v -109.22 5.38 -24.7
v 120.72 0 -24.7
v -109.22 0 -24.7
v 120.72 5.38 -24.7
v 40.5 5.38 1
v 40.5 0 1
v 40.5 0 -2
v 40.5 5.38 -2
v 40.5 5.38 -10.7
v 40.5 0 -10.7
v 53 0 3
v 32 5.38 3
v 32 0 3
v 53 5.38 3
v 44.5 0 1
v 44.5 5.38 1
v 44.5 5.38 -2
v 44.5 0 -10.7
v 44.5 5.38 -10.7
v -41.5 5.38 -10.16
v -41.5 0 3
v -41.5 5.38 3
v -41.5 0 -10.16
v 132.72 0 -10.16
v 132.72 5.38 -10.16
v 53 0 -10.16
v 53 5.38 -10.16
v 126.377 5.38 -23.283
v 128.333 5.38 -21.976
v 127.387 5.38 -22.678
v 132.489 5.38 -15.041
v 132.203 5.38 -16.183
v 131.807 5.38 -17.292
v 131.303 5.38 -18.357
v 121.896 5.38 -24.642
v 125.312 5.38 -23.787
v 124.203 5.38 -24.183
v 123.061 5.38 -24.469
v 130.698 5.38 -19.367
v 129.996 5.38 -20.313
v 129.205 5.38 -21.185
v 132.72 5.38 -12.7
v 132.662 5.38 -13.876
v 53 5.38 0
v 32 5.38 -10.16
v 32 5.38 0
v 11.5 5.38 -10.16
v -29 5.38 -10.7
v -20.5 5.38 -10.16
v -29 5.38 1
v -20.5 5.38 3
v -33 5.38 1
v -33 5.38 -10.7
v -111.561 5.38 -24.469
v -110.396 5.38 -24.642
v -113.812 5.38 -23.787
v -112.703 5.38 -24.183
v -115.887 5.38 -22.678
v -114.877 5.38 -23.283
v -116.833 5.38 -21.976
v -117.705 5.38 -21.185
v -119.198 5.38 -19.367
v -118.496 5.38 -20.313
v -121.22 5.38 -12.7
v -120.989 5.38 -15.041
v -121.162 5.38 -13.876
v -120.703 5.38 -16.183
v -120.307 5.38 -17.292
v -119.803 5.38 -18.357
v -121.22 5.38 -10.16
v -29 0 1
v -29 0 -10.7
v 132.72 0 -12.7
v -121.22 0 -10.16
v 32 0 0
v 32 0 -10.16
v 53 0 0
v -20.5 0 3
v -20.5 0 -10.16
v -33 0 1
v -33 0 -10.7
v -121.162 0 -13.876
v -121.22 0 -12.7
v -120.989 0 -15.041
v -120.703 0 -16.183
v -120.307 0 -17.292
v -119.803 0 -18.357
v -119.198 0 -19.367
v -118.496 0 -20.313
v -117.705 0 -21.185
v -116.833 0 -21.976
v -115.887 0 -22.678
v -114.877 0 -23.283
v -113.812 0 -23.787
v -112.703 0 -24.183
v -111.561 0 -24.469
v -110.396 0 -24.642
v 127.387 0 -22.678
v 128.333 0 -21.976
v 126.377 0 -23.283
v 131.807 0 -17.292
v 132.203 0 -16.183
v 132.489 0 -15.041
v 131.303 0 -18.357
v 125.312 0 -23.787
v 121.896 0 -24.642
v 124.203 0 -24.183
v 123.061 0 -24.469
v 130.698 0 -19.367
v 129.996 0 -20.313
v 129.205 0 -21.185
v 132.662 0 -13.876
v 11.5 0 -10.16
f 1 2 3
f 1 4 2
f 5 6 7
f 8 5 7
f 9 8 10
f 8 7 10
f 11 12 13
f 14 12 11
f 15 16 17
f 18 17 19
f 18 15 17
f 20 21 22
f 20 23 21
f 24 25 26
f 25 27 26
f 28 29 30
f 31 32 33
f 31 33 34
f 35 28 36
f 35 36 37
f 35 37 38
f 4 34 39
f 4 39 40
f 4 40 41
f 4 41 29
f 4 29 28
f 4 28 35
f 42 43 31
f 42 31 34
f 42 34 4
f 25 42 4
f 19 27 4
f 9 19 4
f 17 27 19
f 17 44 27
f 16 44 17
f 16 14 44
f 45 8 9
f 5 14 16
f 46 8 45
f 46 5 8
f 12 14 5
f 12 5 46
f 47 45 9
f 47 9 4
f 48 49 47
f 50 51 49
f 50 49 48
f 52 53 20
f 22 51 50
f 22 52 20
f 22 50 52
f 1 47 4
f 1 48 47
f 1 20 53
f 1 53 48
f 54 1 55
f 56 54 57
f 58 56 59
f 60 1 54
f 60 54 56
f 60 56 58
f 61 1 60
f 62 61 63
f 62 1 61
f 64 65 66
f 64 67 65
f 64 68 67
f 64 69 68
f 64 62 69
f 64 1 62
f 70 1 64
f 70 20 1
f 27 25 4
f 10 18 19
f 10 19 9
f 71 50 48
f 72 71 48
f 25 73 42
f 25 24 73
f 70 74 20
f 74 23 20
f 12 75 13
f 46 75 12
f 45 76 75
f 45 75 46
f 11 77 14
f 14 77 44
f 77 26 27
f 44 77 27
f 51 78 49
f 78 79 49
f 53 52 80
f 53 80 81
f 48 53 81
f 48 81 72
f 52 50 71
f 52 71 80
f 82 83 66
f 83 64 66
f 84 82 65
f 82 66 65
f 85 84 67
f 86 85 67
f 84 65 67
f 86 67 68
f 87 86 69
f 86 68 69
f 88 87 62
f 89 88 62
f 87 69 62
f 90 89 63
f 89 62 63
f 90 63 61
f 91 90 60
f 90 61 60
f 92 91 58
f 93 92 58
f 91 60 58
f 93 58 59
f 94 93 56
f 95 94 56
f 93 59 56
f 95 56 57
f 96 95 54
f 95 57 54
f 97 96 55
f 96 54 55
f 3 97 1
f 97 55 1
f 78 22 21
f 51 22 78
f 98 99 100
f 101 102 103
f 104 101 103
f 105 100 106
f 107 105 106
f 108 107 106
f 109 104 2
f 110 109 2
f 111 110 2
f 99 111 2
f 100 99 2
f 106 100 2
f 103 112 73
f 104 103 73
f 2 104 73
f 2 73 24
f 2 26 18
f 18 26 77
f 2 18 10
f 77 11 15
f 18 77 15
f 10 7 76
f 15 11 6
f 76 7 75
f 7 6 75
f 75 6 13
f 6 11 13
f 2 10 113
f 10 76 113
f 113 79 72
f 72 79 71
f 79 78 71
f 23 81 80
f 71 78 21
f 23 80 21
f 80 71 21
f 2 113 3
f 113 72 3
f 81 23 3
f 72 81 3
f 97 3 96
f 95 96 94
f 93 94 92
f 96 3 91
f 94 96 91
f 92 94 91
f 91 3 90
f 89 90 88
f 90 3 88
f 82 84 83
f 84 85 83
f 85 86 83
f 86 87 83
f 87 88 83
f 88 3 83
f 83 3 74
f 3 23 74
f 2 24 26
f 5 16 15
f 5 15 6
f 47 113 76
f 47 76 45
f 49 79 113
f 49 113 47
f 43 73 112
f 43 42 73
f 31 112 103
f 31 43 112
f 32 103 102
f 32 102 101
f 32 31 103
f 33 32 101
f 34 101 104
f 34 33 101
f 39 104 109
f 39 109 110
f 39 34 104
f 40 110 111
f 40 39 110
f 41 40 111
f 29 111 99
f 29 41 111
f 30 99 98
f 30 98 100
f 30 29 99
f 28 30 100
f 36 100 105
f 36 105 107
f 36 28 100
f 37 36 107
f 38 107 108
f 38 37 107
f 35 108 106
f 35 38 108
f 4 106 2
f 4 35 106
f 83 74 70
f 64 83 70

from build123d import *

# Parameters (mm, degrees)
SKETCH1_W             = 62
SKETCH1_H             = 12.7
BOSS_EXTRUDE1_DEPTH   = 5.38
SKETCH2_W             = 20.5
SKETCH2_H             = 5.38
CUT_EXTRUDE1_DEPTH    = 10.16
SKETCH3_W             = 4
SKETCH3_H             = 8.7
CUT_EXTRUDE2_DEPTH    = 5.38
SKETCH4_W             = 2.54
SKETCH4_H             = 5.38
BOSS_EXTRUDE2_DEPTH   = 59.22
SKETCH5_W             = 2.54
SKETCH5_H             = 5.38
BOSS_EXTRUDE3_DEPTH   = 11.5
BODY_MOVE_COPY3_ANGLE = 180
SKETCH6_W             = 21
SKETCH6_H             = 5.38
BOSS_EXTRUDE4_DEPTH   = 3
SKETCH7_W             = 21
SKETCH7_H             = 5.38
BOSS_EXTRUDE5_DEPTH   = 3
SKETCH8_W             = 4
SKETCH8_H             = 5.38
CUT_EXTRUDE3_DEPTH    = 3
SKETCH9_W             = 4
SKETCH9_H             = 5.38
CUT_EXTRUDE4_DEPTH    = 3
SKETCH11_W            = 253.94
SKETCH11_H            = 5.38
BOSS_EXTRUDE6_DEPTH   = 12
FILLET1_R             = 12


with BuildPart() as part:
    # Sketch1 → Boss-Extrude1 (new body)
    with BuildSketch(Plane(origin=(0, 0, 0), x_dir=(1, 0, 0), z_dir=(0, 1, 0))):
        with Locations((-31, 6.35)):
            Rectangle(SKETCH1_W, SKETCH1_H)
    extrude(amount=BOSS_EXTRUDE1_DEPTH)

    # Sketch2 → Cut-Extrude1 (cut)
    with BuildSketch(Plane.XY):
        with Locations((-51.75, 2.69)):
            Rectangle(SKETCH2_W, SKETCH2_H)
        with Locations((-10.25, 2.69)):
            Rectangle(SKETCH2_W, SKETCH2_H)
    extrude(amount=-CUT_EXTRUDE1_DEPTH, mode=Mode.SUBTRACT)

    # Sketch3 → Cut-Extrude2 (cut)
    with BuildSketch(Plane(origin=(0, 5.38, 0), x_dir=(1, 0, 0), z_dir=(0, 1, 0))):
        with Locations((-31, 6.35)):
            Rectangle(SKETCH3_W, SKETCH3_H)
    extrude(amount=-CUT_EXTRUDE2_DEPTH, mode=Mode.SUBTRACT)

    # Sketch4 → Boss-Extrude2 (add)
    with BuildSketch(Plane.ZY.offset(62)):
        with Locations((-11.43, 2.69)):
            Rectangle(SKETCH4_W, SKETCH4_H)
    extrude(amount=BOSS_EXTRUDE2_DEPTH)


with BuildPart() as body_2:
    # Body-Move/Copy1: copy of part
    add(part.part.moved(Location((0, 31.265873305, 0))))


with BuildPart() as part_1:
    add(part.part)

    # Sketch5 → Boss-Extrude3 (add)
    with BuildSketch(Plane(origin=(0, 0, 0), x_dir=(0, 0, -1), z_dir=(1, 0, 0))):
        with Locations((11.43, 2.69)):
            Rectangle(SKETCH5_W, SKETCH5_H)
    extrude(amount=BOSS_EXTRUDE3_DEPTH)


with BuildPart() as body_2_1:
    # Body-Move/Copy2: moved
    add(body_2.part.moved(Location((152.693560216, 0, 0))))


with BuildPart() as body_2_2:
    # Body-Move/Copy3: moved
    add(body_2_1.part.rotate(Axis((92.083560216, 33.955873305, 0), (0, 0, 1)), BODY_MOVE_COPY3_ANGLE))


with BuildPart() as body_2_3:
    # Body-Move/Copy4: read off the stored shape, not the designer's step
    # Body-Move/Copy4: moved
    add(body_2_2.part.moved(Location((-19.9735602, -31.2658733, 0))))

    # Combine1: union part
    add(part_1.part)

    # Sketch6 → Boss-Extrude4 (add)
    with BuildSketch(Plane.XY):
        with Locations((-31, 2.69)):
            Rectangle(SKETCH6_W, SKETCH6_H)
    extrude(amount=BOSS_EXTRUDE4_DEPTH)

    # Sketch7 → Boss-Extrude5 (add)
    with BuildSketch(Plane.XY):
        with Locations((42.5, 2.69)):
            Rectangle(SKETCH7_W, SKETCH7_H)
    extrude(amount=BOSS_EXTRUDE5_DEPTH)

    # Sketch8 → Cut-Extrude3 (cut)
    with BuildSketch(Plane(origin=(0, 0, -2), x_dir=(-1, 0, 0), z_dir=(0, 0, -1))):
        with Locations((31, 2.69)):
            Rectangle(SKETCH8_W, SKETCH8_H)
    extrude(amount=-CUT_EXTRUDE3_DEPTH, mode=Mode.SUBTRACT)

    # Sketch9 → Cut-Extrude4 (cut)
    with BuildSketch(Plane(origin=(0, 0, -2), x_dir=(-1, 0, 0), z_dir=(0, 0, -1))):
        with Locations((-42.5, 2.69)):
            Rectangle(SKETCH9_W, SKETCH9_H)
    extrude(amount=-CUT_EXTRUDE4_DEPTH, mode=Mode.SUBTRACT)

    # Sketch11 → Boss-Extrude6 (add)
    with BuildSketch(Plane(origin=(0, 0, -12.7), x_dir=(-1, 0, 0), z_dir=(0, 0, -1))):
        with Locations((-5.75, 2.69)):
            Rectangle(SKETCH11_W, SKETCH11_H)
    extrude(amount=BOSS_EXTRUDE6_DEPTH)

    # Fillet1
    fillet1_edges = [body_2_3.edges().sort_by_distance(p)[0] for p in [
        (132.72, 2.69, -24.7),
        (-121.22, 2.69, -24.7),
    ]]
    fillet(fillet1_edges, radius=FILLET1_R)


solid = body_2_3.part
